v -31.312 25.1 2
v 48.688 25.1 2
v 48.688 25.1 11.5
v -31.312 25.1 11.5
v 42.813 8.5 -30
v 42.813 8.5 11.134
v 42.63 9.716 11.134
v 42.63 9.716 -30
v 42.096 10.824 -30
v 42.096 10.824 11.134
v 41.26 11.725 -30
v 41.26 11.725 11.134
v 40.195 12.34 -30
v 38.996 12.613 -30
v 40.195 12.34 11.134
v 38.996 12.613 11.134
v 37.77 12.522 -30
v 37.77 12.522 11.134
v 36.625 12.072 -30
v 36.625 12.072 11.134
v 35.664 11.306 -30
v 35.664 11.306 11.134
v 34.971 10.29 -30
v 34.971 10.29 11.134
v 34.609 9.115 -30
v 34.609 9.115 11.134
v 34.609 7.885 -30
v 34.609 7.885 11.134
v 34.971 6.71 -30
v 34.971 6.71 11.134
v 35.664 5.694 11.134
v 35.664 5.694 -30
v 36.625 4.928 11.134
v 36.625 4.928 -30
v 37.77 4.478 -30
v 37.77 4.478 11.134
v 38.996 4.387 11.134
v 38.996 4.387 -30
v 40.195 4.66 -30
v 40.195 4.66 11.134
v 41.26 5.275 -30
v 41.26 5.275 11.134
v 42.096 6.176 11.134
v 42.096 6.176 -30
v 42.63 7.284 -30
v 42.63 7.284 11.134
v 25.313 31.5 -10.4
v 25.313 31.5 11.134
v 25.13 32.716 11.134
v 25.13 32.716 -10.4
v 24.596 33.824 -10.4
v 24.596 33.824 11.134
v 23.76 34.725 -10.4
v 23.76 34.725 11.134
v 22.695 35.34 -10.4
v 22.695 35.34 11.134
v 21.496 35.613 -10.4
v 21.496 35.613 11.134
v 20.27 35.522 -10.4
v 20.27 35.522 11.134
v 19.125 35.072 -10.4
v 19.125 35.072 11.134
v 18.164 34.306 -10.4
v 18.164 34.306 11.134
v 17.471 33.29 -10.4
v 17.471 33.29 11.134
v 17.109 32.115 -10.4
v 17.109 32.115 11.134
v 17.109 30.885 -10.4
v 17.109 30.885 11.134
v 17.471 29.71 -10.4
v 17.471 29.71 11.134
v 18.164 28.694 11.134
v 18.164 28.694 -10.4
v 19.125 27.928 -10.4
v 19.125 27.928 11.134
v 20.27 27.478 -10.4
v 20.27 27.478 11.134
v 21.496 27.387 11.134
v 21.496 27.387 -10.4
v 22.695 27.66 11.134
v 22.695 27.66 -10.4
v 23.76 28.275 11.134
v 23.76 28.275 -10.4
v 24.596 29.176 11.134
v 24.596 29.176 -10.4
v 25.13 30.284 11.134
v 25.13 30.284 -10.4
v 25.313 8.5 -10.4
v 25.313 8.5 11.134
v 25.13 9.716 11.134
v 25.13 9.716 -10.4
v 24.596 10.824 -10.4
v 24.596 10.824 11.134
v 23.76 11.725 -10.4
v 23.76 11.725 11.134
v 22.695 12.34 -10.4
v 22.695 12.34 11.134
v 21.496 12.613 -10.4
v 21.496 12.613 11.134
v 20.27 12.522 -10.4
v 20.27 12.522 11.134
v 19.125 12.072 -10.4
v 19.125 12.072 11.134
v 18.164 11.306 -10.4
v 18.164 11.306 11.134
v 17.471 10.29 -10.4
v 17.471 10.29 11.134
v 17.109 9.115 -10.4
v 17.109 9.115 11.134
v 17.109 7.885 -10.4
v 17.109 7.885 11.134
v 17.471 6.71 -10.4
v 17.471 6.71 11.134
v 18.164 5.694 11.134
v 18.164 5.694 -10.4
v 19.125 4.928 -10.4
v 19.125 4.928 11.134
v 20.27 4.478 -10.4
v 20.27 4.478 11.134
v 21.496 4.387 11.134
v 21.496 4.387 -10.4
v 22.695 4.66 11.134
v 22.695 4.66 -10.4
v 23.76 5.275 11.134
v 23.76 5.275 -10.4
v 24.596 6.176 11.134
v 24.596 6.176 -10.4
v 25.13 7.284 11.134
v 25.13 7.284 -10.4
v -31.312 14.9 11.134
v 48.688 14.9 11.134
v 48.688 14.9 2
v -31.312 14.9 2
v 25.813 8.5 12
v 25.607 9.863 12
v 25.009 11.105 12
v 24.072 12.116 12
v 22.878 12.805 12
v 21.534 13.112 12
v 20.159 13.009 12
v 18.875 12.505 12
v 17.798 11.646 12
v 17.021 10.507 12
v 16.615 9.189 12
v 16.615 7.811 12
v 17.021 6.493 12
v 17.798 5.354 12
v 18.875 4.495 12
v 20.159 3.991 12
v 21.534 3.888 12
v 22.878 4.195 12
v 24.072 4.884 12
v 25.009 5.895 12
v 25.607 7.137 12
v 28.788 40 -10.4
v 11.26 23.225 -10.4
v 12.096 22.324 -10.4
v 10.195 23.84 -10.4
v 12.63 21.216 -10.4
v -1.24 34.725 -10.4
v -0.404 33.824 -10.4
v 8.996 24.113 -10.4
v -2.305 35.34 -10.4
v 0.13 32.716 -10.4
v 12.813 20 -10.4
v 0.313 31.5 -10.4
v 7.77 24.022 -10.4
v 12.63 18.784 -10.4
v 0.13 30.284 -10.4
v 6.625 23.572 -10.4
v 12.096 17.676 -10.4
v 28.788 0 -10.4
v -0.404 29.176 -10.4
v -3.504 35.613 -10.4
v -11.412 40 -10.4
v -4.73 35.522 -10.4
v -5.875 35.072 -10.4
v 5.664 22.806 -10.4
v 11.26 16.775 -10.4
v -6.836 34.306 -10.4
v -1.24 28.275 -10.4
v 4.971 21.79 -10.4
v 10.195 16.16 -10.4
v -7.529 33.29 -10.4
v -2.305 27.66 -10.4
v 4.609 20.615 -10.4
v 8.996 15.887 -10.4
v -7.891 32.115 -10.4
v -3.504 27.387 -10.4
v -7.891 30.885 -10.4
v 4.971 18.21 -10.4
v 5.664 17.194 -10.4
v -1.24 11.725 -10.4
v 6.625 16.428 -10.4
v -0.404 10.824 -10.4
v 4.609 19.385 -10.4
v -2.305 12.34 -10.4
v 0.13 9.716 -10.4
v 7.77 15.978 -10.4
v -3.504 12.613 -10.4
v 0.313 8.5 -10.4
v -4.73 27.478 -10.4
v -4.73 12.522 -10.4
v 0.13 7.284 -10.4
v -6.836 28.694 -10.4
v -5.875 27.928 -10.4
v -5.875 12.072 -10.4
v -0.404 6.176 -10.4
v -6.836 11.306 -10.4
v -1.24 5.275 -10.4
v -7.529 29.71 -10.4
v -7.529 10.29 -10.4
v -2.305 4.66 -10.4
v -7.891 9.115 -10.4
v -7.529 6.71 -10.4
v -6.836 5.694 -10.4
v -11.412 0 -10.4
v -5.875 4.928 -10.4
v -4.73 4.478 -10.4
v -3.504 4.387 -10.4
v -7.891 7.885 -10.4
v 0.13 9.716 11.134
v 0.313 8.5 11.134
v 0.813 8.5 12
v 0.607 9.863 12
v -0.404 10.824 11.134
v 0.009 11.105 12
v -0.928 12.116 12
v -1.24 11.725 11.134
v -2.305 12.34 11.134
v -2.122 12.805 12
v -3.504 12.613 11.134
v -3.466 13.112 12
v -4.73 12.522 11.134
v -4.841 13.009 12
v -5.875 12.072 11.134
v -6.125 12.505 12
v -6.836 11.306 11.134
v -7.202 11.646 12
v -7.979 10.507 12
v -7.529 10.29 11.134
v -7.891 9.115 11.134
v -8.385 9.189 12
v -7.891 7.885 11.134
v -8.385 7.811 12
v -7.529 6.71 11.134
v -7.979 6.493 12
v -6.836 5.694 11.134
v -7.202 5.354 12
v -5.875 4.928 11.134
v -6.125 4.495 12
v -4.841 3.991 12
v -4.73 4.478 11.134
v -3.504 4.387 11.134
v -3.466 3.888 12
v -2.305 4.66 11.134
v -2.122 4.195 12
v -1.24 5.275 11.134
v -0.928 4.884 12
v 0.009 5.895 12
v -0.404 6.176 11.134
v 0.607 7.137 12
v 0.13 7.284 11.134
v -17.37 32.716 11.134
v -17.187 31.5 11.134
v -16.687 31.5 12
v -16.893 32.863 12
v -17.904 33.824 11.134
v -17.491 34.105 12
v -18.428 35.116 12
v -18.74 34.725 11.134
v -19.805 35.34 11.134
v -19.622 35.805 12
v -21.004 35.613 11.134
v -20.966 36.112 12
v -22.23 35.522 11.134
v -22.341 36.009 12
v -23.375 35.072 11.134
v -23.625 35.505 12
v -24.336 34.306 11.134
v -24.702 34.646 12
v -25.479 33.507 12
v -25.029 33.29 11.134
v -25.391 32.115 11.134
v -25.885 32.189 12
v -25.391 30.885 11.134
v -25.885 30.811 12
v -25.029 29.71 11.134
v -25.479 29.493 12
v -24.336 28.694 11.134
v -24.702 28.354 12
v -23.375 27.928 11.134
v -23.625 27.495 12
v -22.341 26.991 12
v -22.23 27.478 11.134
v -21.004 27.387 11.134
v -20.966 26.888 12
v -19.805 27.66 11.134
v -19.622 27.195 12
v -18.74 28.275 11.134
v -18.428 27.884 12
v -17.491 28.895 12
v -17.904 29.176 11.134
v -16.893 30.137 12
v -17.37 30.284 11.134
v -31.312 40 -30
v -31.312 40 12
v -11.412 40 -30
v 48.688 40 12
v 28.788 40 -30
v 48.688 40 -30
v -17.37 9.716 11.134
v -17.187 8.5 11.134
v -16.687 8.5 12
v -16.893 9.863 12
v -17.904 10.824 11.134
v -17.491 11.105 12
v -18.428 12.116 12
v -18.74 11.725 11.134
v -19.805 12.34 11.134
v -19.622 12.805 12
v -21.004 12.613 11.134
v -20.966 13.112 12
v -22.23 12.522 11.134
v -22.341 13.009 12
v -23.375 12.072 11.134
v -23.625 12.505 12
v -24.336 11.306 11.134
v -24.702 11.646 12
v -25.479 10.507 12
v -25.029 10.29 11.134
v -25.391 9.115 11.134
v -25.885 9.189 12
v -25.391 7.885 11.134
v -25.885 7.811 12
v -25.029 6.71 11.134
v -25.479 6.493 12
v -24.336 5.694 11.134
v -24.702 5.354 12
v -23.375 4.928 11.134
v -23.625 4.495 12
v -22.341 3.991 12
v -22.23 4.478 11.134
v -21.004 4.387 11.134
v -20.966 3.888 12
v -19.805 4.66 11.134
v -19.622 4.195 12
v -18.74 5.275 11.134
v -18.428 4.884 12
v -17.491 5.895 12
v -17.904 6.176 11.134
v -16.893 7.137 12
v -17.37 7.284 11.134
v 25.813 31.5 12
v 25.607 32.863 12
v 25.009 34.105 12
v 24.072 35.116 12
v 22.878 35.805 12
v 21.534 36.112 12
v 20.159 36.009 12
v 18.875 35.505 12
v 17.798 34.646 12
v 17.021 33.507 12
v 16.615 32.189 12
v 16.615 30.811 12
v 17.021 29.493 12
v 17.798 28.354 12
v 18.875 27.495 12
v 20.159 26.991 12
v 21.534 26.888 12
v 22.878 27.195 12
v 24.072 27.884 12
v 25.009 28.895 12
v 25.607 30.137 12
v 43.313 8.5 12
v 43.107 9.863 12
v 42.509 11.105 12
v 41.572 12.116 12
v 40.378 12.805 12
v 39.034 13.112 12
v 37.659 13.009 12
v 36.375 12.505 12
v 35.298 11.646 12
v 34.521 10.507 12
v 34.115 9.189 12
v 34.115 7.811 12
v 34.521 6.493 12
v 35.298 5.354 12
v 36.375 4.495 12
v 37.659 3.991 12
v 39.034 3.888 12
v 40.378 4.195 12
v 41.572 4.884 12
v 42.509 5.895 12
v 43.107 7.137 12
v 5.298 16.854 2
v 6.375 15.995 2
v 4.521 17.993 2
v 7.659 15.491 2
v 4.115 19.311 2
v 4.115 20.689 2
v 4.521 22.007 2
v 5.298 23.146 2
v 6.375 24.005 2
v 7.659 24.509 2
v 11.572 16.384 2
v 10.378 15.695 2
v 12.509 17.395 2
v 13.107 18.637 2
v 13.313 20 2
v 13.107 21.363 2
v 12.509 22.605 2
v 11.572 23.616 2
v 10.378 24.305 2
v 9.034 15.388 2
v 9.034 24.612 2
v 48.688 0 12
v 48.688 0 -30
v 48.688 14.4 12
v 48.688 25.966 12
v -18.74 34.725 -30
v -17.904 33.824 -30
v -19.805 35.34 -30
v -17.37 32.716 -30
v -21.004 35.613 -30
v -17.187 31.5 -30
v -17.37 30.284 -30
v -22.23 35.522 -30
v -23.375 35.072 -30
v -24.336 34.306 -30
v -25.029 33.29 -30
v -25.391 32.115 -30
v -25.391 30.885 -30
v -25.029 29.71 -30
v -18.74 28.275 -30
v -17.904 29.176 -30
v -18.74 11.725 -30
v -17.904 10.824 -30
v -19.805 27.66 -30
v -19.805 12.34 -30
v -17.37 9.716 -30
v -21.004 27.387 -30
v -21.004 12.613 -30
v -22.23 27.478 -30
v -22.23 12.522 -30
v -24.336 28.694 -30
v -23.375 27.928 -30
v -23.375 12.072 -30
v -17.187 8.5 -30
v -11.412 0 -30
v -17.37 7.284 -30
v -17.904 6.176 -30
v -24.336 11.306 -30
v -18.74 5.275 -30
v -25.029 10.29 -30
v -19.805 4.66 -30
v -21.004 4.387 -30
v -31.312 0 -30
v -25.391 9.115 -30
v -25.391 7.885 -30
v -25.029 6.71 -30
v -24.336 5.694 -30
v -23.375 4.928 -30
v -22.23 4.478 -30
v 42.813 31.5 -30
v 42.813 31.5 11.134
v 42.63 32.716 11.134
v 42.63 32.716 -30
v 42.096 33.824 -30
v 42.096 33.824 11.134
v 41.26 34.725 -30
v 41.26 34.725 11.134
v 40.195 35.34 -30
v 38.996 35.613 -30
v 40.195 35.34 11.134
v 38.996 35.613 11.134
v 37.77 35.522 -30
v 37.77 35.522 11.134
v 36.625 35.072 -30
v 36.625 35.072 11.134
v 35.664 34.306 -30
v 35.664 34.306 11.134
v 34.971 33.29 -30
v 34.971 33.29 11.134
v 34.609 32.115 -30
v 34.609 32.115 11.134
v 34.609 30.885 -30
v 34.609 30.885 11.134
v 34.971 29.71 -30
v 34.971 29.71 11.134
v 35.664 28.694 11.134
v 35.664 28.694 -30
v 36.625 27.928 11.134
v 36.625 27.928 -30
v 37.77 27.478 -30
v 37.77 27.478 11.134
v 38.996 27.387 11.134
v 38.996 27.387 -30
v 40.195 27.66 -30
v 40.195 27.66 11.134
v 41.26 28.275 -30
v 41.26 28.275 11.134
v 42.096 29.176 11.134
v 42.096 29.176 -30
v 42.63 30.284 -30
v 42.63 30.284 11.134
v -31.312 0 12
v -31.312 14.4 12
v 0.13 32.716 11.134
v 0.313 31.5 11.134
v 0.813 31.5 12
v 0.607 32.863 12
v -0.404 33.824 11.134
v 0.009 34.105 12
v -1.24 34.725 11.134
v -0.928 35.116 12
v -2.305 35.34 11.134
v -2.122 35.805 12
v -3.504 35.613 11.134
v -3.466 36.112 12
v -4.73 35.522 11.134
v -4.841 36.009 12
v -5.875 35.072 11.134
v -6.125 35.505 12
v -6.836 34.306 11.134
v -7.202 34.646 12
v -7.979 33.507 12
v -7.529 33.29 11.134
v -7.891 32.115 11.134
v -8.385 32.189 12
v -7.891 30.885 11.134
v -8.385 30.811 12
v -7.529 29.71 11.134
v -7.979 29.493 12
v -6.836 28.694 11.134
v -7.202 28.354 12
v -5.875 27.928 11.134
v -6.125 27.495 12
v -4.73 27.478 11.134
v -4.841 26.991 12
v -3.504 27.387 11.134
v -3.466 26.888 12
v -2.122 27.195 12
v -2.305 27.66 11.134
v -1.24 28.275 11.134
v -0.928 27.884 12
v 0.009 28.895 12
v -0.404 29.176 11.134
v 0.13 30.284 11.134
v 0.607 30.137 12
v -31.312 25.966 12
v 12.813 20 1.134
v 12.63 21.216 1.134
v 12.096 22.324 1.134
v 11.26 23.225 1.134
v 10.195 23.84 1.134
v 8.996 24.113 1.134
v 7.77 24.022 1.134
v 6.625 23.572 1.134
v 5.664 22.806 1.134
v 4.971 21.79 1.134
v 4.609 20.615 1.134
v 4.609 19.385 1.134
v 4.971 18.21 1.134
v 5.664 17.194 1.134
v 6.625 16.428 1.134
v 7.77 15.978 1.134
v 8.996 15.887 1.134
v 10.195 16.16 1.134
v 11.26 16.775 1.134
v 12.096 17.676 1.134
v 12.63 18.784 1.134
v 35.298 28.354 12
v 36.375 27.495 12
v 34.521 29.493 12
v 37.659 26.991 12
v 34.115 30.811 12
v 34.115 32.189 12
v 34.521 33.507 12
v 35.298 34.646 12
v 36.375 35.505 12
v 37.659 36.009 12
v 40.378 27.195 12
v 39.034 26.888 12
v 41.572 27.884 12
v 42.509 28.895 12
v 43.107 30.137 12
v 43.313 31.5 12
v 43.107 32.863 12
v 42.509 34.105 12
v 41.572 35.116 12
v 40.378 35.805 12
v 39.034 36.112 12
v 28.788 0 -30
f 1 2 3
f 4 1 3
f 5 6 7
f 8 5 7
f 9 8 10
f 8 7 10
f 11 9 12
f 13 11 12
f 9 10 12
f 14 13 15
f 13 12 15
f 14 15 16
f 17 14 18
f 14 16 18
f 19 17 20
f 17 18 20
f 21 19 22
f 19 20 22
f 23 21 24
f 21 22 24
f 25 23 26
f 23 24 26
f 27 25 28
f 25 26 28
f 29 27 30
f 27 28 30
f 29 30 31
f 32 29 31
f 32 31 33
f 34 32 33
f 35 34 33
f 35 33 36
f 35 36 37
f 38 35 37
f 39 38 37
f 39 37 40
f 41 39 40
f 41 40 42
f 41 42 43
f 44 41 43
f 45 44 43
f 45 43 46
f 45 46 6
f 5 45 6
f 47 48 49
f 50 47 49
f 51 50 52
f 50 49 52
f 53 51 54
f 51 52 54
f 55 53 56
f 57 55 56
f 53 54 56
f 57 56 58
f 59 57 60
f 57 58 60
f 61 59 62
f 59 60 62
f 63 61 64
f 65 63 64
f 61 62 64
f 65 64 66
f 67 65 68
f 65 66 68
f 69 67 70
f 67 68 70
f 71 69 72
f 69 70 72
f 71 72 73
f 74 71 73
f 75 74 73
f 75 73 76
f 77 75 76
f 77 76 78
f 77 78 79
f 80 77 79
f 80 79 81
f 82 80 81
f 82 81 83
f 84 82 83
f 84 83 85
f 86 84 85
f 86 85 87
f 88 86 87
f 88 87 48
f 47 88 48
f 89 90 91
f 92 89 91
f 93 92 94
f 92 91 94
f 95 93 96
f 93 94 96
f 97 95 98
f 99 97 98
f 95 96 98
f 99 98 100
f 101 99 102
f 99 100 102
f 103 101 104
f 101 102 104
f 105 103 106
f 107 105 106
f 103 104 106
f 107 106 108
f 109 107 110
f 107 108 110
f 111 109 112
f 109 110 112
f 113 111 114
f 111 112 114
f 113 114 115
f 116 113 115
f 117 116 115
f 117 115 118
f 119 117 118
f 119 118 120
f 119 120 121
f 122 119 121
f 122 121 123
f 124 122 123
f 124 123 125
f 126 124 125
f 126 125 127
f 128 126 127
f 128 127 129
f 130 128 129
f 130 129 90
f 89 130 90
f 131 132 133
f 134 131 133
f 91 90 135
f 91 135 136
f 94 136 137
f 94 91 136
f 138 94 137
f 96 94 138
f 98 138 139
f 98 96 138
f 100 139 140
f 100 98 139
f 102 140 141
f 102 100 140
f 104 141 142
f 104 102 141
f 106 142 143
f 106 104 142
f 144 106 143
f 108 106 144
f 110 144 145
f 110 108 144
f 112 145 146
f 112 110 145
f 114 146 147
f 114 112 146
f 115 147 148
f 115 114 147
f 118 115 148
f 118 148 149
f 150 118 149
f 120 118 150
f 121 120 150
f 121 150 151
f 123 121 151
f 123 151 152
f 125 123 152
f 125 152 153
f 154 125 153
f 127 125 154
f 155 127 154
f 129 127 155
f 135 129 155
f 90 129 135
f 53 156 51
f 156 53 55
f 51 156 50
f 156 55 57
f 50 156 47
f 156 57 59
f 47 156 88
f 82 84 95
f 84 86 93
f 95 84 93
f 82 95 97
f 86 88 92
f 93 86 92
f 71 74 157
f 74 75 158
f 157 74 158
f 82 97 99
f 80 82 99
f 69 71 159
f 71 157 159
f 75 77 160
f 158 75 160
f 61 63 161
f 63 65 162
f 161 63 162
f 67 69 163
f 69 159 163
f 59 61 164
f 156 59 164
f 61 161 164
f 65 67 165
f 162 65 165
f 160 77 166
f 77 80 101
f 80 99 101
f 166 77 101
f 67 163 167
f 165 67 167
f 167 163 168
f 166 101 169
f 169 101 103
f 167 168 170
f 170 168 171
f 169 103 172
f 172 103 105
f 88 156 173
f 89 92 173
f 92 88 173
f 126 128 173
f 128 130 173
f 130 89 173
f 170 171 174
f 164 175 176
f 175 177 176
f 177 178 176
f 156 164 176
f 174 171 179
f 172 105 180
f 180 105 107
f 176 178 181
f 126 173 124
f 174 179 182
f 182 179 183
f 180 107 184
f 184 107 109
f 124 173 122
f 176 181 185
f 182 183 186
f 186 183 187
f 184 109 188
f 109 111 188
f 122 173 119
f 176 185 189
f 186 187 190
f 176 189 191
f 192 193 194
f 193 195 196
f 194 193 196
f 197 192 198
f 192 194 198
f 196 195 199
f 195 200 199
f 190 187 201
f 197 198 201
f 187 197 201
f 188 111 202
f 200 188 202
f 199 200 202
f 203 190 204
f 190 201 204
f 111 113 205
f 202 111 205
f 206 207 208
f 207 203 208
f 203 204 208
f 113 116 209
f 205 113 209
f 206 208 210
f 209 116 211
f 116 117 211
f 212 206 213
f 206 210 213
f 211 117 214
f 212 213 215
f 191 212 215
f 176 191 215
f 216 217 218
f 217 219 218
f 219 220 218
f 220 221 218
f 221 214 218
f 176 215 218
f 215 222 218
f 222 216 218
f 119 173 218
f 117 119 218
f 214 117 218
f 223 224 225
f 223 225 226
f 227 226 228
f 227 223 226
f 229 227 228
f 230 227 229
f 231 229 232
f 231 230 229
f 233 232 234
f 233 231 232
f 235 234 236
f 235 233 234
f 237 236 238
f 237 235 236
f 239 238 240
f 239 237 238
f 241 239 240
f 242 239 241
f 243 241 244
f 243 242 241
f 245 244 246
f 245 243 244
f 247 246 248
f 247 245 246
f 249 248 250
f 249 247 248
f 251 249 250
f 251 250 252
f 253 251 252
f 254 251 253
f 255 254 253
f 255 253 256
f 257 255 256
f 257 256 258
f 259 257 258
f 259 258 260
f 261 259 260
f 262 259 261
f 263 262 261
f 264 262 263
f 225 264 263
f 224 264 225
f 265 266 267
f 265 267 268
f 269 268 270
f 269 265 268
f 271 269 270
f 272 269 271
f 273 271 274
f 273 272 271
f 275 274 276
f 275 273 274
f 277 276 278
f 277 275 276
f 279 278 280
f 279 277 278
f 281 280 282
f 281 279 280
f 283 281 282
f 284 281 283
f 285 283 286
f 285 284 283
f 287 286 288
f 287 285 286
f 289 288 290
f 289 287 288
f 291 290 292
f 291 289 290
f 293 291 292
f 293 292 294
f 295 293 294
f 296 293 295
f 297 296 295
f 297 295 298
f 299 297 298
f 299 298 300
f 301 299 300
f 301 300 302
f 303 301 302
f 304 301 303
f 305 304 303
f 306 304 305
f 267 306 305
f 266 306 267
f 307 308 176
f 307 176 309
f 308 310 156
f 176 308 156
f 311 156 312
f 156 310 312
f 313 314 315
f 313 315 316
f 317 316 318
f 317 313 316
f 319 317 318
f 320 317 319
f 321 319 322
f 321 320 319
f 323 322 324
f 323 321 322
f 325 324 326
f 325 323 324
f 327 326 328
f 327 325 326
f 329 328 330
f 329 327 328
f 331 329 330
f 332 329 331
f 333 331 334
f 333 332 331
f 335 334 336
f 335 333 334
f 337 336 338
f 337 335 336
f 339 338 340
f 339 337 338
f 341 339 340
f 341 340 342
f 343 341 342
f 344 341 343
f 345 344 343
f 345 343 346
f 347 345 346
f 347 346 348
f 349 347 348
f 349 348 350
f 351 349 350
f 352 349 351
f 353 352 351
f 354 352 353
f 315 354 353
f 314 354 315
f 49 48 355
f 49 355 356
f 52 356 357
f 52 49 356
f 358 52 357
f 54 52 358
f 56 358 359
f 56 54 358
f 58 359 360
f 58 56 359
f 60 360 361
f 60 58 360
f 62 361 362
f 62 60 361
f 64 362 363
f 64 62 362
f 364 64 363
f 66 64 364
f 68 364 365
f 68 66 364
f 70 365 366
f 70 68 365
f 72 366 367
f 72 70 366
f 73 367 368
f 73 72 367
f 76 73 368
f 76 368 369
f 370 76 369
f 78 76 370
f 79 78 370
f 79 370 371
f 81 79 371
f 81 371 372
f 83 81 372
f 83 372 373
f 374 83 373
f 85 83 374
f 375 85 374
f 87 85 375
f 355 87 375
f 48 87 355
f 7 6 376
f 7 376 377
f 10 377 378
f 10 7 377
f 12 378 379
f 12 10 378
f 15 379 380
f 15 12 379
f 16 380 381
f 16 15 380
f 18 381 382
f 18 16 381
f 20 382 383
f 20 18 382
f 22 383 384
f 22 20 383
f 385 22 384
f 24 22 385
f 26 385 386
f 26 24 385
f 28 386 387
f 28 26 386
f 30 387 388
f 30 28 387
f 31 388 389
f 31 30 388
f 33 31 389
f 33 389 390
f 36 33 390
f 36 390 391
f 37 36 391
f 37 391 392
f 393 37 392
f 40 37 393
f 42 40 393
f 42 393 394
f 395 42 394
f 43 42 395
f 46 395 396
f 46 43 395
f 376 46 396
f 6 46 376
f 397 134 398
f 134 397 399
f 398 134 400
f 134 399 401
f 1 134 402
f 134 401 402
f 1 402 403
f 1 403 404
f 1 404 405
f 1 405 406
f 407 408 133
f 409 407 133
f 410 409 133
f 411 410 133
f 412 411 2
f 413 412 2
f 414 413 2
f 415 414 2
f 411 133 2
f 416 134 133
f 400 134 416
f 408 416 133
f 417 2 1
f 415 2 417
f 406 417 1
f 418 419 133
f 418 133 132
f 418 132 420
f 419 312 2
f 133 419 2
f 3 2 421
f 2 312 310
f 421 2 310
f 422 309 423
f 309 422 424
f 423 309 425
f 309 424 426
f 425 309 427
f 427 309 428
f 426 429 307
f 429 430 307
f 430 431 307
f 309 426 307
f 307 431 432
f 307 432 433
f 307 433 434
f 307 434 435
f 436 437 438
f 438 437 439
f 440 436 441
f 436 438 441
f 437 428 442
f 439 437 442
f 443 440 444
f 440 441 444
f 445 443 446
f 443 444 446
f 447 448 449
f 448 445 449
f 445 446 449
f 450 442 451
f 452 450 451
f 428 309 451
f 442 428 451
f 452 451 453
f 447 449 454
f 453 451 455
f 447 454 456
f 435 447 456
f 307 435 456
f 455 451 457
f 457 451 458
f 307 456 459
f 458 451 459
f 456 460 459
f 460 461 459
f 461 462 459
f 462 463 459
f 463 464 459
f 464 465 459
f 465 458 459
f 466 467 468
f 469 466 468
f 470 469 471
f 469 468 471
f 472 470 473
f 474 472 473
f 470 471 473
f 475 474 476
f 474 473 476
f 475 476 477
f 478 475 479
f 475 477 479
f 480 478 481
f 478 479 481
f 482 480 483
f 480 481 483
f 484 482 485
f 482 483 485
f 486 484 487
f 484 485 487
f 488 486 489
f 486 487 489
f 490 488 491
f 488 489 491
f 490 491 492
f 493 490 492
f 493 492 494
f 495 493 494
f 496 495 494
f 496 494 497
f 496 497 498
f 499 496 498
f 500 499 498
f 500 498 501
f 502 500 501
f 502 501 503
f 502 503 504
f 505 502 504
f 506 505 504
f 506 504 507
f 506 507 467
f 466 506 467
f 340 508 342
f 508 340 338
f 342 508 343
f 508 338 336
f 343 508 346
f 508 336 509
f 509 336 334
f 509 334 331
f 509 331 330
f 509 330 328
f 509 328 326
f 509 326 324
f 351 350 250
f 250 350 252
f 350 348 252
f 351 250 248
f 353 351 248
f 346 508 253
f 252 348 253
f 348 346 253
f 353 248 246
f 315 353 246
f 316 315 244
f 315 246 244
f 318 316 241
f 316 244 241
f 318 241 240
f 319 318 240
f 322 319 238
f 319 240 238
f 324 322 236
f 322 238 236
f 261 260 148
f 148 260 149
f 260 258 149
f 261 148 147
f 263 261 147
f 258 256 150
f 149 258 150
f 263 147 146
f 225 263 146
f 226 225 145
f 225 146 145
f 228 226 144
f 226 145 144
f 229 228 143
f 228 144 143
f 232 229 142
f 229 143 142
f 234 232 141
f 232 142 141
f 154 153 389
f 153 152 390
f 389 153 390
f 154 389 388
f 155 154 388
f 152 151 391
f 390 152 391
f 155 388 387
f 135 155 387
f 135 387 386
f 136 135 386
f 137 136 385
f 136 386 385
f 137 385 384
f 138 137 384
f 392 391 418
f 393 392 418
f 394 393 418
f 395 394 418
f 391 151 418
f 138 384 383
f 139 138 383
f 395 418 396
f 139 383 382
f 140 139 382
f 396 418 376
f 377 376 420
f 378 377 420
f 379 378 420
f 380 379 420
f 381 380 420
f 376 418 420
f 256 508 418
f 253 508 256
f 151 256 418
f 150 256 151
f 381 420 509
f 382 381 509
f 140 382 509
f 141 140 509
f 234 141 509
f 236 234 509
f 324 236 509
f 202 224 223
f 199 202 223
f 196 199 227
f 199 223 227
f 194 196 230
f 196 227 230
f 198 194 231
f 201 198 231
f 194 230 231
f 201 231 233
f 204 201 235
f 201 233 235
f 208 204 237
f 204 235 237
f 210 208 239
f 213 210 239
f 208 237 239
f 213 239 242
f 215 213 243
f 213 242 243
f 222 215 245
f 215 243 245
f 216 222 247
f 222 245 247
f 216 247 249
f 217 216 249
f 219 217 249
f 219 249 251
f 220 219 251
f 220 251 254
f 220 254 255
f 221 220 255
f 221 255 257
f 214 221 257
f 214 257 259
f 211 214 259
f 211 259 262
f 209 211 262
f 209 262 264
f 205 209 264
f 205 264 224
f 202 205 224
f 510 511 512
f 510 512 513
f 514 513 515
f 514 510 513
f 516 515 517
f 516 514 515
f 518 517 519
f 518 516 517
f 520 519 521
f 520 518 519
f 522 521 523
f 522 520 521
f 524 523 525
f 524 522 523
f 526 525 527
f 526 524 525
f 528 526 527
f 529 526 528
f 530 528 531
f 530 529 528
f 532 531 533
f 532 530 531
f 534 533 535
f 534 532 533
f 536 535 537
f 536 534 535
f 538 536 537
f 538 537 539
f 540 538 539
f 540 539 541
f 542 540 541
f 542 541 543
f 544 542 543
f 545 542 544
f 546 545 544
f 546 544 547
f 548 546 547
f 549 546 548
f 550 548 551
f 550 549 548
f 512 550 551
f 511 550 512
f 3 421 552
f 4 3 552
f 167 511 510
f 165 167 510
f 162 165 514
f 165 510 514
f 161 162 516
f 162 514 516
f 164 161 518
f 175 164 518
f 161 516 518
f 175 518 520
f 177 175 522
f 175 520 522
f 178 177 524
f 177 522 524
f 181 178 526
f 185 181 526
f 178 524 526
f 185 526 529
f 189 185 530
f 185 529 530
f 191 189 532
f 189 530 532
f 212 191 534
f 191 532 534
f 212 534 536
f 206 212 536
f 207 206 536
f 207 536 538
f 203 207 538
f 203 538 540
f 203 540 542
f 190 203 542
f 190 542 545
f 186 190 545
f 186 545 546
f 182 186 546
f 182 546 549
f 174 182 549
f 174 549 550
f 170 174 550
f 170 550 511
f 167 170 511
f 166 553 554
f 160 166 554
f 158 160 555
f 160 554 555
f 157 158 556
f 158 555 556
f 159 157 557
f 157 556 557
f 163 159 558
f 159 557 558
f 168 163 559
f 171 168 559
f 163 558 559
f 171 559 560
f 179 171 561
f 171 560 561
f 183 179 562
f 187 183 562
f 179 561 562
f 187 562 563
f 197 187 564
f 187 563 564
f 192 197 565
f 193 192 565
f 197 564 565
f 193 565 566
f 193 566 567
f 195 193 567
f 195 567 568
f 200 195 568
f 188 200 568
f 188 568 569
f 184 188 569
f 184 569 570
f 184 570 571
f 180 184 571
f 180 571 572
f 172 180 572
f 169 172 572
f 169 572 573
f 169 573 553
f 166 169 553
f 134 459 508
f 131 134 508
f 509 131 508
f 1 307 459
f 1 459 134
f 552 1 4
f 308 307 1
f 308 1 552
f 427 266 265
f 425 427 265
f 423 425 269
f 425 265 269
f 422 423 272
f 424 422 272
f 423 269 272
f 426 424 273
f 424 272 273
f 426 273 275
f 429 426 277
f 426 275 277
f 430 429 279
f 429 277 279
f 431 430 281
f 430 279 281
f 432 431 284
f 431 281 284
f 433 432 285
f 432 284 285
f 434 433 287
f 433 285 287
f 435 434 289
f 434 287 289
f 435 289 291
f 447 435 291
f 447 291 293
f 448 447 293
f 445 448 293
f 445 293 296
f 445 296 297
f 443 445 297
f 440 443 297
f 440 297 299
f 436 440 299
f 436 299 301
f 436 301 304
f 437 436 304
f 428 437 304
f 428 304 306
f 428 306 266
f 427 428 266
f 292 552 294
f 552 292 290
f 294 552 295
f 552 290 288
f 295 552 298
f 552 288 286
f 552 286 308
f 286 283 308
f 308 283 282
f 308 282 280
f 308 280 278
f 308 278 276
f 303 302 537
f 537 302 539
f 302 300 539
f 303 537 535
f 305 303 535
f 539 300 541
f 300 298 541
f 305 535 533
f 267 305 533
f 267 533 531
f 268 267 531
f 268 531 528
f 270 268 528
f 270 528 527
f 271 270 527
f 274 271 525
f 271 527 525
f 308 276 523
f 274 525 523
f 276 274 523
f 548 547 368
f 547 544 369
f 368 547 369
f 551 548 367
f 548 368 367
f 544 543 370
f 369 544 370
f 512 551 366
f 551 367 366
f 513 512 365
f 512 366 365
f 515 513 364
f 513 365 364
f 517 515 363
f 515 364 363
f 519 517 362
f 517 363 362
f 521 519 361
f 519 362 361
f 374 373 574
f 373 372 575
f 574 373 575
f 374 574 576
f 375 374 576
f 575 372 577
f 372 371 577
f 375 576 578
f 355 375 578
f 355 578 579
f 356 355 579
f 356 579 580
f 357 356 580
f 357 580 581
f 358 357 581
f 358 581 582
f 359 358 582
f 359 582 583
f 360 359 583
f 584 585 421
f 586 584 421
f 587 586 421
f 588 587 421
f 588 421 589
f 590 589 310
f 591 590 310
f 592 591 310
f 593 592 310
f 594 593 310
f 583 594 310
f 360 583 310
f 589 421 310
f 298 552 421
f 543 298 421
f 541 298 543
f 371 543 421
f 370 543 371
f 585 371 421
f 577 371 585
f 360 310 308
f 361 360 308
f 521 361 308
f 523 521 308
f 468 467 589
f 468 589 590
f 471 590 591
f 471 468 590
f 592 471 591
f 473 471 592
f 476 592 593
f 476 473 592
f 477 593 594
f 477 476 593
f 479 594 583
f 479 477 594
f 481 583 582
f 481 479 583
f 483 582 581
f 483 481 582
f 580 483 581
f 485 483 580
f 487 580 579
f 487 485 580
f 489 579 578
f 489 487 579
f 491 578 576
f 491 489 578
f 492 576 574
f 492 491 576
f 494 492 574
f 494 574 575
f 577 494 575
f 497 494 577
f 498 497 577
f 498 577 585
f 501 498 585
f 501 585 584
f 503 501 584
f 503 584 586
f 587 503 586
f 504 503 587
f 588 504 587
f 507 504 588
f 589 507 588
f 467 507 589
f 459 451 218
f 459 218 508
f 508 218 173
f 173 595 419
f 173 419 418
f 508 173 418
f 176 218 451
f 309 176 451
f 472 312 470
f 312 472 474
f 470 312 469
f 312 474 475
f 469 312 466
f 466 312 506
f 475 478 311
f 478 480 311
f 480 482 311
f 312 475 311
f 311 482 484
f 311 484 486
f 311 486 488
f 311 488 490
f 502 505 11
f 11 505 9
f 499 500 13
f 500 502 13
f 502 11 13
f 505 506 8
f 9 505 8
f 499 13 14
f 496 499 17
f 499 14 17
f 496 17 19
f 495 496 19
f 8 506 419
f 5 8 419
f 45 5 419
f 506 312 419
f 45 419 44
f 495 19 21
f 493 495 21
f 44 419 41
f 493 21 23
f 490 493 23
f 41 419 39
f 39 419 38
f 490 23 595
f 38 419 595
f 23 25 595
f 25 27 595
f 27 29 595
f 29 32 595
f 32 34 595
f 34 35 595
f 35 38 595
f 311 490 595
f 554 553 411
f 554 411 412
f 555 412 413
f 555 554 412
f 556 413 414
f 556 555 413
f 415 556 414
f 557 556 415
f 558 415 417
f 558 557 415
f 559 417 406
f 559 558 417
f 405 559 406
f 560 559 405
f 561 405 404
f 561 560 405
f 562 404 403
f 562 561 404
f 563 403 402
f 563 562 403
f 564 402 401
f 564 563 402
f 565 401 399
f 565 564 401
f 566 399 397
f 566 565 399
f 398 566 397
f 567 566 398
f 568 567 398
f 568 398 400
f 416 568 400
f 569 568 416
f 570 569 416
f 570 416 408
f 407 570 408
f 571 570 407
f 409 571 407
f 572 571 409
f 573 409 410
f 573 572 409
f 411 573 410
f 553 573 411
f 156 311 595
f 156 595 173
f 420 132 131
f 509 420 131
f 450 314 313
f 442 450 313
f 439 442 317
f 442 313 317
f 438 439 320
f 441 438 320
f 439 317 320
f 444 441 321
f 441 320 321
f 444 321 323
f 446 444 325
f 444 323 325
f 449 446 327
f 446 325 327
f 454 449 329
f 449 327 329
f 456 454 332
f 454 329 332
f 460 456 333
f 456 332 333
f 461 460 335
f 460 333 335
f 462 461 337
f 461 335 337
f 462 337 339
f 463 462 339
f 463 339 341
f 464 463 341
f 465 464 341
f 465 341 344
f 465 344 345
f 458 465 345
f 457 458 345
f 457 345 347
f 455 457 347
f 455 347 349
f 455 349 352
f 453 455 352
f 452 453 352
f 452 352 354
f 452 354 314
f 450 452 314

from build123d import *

# Parameters (mm, degrees)
BOSS_EXTRUDE2_DEPTH   = 40
BOSS_EXTRUDE3_DEPTH   = 80
SKETCH5_R             = 4.125
CUT_EXTRUDE1_DEPTH    = 43
CHAMFER1_SIZE         = 0.5
CHAMFER1_SIZE2        = 0.866025404
CHAMFER1_PART_2_SIZE  = 0.5
CHAMFER1_PART_2_SIZE2 = 0.866025404
CHAMFER1_PART_3_SIZE  = 0.5
CHAMFER1_PART_3_SIZE2 = 0.866025404
CHAMFER1_PART_4_SIZE  = 0.5
CHAMFER1_PART_4_SIZE2 = 0.866025404


with BuildPart() as part:
    # Sketch2 → Boss-Extrude2 (new body)
    with BuildSketch(Plane(origin=(0, 0, 0), x_dir=(1, 0, 0), z_dir=(0, 1, 0))):
        Polygon((-31.312103746, 30), (-31.312103746, 0), (48.687896254, 0), (48.687896254, 30), (28.787896254, 30), (28.787896254, 10.4), (-11.412103746, 10.4), (-11.412103746, 30), align=None)
    extrude(amount=BOSS_EXTRUDE2_DEPTH)

    # Sketch4 → Boss-Extrude3 (add)
    with BuildSketch(Plane(origin=(48.687896254, 0, 0), x_dir=(0, 0, -1), z_dir=(1, 0, 0))):
        Polygon((0, 0), (-12, 0), (-12, 14.9), (-2, 14.9), (-2, 25.1), (-12, 25.1), (-12, 40), (0, 40), align=None)
    extrude(amount=-BOSS_EXTRUDE3_DEPTH)

    # Sketch5 → Cut-Extrude1 (cut, through all)
    with BuildSketch(Plane.XY.offset(12)):
        with Locations((-3.812103746, 31.5)):
            Circle(SKETCH5_R)
        with Locations((21.187896254, 31.5)):
            Circle(SKETCH5_R)
        with Locations((21.187896254, 8.5)):
            Circle(SKETCH5_R)
        with Locations((-3.812103746, 8.5)):
            Circle(SKETCH5_R)
        with Locations((-21.312103746, 31.5)):
            Circle(SKETCH5_R)
        with Locations((-21.312103746, 8.5)):
            Circle(SKETCH5_R)
        with Locations((38.687896254, 8.5)):
            Circle(SKETCH5_R)
        with Locations((38.687896254, 31.5)):
            Circle(SKETCH5_R)
        with Locations((8.687896254, 20)):
            Circle(SKETCH5_R)
    extrude(amount=-CUT_EXTRUDE1_DEPTH, mode=Mode.SUBTRACT)

    # Chamfer1
    chamfer1_edges = [part.edges().sort_by_distance(p)[0] for p in [
        (8.687896254, 14.9, 12),
        (34.562896254, 8.5, 12),
        (-25.437103746, 8.5, 12),
        (-7.937103746, 8.5, 12),
        (17.062896254, 8.5, 12),
    ]]
    chamfer1_side = [part.faces().sort_by_distance(p)[0] for p in [
        (8.687896254, 7.220474811, 12),
    ]]
    chamfer(chamfer1_edges, length=CHAMFER1_SIZE, length2=CHAMFER1_SIZE2, reference=chamfer1_side[0])

    # Chamfer1 part 2
    chamfer1_part_2_edges = [part.edges().sort_by_distance(p)[0] for p in [
        (8.687896254, 25.1, 12),
    ]]
    chamfer1_part_2_side = [part.faces().sort_by_distance(p)[0] for p in [
        (8.687896254, 25.1, 7),
    ]]
    chamfer(chamfer1_part_2_edges, length=CHAMFER1_PART_2_SIZE, length2=CHAMFER1_PART_2_SIZE2, reference=chamfer1_part_2_side[0])

    # Chamfer1 part 3
    chamfer1_part_3_edges = [part.edges().sort_by_distance(p)[0] for p in [
        (-7.937103746, 31.5, 12),
        (34.562896254, 31.5, 12),
        (-25.437103746, 31.5, 12),
        (17.062896254, 31.5, 12),
    ]]
    chamfer1_part_3_side = [part.faces().sort_by_distance(p)[0] for p in [
        (8.687896254, 32.779525189, 12),
    ]]
    chamfer(chamfer1_part_3_edges, length=CHAMFER1_PART_3_SIZE, length2=CHAMFER1_PART_3_SIZE2, reference=chamfer1_part_3_side[0])

    # Chamfer1 part 4
    chamfer1_part_4_edges = [part.edges().sort_by_distance(p)[0] for p in [
        (4.562896254, 20, 2),
    ]]
    chamfer1_part_4_side = [part.faces().sort_by_distance(p)[0] for p in [
        (8.687896254, 15.706476286, 2),
    ]]
    chamfer(chamfer1_part_4_edges, length=CHAMFER1_PART_4_SIZE, length2=CHAMFER1_PART_4_SIZE2, reference=chamfer1_part_4_side[0])


solid = part.part
